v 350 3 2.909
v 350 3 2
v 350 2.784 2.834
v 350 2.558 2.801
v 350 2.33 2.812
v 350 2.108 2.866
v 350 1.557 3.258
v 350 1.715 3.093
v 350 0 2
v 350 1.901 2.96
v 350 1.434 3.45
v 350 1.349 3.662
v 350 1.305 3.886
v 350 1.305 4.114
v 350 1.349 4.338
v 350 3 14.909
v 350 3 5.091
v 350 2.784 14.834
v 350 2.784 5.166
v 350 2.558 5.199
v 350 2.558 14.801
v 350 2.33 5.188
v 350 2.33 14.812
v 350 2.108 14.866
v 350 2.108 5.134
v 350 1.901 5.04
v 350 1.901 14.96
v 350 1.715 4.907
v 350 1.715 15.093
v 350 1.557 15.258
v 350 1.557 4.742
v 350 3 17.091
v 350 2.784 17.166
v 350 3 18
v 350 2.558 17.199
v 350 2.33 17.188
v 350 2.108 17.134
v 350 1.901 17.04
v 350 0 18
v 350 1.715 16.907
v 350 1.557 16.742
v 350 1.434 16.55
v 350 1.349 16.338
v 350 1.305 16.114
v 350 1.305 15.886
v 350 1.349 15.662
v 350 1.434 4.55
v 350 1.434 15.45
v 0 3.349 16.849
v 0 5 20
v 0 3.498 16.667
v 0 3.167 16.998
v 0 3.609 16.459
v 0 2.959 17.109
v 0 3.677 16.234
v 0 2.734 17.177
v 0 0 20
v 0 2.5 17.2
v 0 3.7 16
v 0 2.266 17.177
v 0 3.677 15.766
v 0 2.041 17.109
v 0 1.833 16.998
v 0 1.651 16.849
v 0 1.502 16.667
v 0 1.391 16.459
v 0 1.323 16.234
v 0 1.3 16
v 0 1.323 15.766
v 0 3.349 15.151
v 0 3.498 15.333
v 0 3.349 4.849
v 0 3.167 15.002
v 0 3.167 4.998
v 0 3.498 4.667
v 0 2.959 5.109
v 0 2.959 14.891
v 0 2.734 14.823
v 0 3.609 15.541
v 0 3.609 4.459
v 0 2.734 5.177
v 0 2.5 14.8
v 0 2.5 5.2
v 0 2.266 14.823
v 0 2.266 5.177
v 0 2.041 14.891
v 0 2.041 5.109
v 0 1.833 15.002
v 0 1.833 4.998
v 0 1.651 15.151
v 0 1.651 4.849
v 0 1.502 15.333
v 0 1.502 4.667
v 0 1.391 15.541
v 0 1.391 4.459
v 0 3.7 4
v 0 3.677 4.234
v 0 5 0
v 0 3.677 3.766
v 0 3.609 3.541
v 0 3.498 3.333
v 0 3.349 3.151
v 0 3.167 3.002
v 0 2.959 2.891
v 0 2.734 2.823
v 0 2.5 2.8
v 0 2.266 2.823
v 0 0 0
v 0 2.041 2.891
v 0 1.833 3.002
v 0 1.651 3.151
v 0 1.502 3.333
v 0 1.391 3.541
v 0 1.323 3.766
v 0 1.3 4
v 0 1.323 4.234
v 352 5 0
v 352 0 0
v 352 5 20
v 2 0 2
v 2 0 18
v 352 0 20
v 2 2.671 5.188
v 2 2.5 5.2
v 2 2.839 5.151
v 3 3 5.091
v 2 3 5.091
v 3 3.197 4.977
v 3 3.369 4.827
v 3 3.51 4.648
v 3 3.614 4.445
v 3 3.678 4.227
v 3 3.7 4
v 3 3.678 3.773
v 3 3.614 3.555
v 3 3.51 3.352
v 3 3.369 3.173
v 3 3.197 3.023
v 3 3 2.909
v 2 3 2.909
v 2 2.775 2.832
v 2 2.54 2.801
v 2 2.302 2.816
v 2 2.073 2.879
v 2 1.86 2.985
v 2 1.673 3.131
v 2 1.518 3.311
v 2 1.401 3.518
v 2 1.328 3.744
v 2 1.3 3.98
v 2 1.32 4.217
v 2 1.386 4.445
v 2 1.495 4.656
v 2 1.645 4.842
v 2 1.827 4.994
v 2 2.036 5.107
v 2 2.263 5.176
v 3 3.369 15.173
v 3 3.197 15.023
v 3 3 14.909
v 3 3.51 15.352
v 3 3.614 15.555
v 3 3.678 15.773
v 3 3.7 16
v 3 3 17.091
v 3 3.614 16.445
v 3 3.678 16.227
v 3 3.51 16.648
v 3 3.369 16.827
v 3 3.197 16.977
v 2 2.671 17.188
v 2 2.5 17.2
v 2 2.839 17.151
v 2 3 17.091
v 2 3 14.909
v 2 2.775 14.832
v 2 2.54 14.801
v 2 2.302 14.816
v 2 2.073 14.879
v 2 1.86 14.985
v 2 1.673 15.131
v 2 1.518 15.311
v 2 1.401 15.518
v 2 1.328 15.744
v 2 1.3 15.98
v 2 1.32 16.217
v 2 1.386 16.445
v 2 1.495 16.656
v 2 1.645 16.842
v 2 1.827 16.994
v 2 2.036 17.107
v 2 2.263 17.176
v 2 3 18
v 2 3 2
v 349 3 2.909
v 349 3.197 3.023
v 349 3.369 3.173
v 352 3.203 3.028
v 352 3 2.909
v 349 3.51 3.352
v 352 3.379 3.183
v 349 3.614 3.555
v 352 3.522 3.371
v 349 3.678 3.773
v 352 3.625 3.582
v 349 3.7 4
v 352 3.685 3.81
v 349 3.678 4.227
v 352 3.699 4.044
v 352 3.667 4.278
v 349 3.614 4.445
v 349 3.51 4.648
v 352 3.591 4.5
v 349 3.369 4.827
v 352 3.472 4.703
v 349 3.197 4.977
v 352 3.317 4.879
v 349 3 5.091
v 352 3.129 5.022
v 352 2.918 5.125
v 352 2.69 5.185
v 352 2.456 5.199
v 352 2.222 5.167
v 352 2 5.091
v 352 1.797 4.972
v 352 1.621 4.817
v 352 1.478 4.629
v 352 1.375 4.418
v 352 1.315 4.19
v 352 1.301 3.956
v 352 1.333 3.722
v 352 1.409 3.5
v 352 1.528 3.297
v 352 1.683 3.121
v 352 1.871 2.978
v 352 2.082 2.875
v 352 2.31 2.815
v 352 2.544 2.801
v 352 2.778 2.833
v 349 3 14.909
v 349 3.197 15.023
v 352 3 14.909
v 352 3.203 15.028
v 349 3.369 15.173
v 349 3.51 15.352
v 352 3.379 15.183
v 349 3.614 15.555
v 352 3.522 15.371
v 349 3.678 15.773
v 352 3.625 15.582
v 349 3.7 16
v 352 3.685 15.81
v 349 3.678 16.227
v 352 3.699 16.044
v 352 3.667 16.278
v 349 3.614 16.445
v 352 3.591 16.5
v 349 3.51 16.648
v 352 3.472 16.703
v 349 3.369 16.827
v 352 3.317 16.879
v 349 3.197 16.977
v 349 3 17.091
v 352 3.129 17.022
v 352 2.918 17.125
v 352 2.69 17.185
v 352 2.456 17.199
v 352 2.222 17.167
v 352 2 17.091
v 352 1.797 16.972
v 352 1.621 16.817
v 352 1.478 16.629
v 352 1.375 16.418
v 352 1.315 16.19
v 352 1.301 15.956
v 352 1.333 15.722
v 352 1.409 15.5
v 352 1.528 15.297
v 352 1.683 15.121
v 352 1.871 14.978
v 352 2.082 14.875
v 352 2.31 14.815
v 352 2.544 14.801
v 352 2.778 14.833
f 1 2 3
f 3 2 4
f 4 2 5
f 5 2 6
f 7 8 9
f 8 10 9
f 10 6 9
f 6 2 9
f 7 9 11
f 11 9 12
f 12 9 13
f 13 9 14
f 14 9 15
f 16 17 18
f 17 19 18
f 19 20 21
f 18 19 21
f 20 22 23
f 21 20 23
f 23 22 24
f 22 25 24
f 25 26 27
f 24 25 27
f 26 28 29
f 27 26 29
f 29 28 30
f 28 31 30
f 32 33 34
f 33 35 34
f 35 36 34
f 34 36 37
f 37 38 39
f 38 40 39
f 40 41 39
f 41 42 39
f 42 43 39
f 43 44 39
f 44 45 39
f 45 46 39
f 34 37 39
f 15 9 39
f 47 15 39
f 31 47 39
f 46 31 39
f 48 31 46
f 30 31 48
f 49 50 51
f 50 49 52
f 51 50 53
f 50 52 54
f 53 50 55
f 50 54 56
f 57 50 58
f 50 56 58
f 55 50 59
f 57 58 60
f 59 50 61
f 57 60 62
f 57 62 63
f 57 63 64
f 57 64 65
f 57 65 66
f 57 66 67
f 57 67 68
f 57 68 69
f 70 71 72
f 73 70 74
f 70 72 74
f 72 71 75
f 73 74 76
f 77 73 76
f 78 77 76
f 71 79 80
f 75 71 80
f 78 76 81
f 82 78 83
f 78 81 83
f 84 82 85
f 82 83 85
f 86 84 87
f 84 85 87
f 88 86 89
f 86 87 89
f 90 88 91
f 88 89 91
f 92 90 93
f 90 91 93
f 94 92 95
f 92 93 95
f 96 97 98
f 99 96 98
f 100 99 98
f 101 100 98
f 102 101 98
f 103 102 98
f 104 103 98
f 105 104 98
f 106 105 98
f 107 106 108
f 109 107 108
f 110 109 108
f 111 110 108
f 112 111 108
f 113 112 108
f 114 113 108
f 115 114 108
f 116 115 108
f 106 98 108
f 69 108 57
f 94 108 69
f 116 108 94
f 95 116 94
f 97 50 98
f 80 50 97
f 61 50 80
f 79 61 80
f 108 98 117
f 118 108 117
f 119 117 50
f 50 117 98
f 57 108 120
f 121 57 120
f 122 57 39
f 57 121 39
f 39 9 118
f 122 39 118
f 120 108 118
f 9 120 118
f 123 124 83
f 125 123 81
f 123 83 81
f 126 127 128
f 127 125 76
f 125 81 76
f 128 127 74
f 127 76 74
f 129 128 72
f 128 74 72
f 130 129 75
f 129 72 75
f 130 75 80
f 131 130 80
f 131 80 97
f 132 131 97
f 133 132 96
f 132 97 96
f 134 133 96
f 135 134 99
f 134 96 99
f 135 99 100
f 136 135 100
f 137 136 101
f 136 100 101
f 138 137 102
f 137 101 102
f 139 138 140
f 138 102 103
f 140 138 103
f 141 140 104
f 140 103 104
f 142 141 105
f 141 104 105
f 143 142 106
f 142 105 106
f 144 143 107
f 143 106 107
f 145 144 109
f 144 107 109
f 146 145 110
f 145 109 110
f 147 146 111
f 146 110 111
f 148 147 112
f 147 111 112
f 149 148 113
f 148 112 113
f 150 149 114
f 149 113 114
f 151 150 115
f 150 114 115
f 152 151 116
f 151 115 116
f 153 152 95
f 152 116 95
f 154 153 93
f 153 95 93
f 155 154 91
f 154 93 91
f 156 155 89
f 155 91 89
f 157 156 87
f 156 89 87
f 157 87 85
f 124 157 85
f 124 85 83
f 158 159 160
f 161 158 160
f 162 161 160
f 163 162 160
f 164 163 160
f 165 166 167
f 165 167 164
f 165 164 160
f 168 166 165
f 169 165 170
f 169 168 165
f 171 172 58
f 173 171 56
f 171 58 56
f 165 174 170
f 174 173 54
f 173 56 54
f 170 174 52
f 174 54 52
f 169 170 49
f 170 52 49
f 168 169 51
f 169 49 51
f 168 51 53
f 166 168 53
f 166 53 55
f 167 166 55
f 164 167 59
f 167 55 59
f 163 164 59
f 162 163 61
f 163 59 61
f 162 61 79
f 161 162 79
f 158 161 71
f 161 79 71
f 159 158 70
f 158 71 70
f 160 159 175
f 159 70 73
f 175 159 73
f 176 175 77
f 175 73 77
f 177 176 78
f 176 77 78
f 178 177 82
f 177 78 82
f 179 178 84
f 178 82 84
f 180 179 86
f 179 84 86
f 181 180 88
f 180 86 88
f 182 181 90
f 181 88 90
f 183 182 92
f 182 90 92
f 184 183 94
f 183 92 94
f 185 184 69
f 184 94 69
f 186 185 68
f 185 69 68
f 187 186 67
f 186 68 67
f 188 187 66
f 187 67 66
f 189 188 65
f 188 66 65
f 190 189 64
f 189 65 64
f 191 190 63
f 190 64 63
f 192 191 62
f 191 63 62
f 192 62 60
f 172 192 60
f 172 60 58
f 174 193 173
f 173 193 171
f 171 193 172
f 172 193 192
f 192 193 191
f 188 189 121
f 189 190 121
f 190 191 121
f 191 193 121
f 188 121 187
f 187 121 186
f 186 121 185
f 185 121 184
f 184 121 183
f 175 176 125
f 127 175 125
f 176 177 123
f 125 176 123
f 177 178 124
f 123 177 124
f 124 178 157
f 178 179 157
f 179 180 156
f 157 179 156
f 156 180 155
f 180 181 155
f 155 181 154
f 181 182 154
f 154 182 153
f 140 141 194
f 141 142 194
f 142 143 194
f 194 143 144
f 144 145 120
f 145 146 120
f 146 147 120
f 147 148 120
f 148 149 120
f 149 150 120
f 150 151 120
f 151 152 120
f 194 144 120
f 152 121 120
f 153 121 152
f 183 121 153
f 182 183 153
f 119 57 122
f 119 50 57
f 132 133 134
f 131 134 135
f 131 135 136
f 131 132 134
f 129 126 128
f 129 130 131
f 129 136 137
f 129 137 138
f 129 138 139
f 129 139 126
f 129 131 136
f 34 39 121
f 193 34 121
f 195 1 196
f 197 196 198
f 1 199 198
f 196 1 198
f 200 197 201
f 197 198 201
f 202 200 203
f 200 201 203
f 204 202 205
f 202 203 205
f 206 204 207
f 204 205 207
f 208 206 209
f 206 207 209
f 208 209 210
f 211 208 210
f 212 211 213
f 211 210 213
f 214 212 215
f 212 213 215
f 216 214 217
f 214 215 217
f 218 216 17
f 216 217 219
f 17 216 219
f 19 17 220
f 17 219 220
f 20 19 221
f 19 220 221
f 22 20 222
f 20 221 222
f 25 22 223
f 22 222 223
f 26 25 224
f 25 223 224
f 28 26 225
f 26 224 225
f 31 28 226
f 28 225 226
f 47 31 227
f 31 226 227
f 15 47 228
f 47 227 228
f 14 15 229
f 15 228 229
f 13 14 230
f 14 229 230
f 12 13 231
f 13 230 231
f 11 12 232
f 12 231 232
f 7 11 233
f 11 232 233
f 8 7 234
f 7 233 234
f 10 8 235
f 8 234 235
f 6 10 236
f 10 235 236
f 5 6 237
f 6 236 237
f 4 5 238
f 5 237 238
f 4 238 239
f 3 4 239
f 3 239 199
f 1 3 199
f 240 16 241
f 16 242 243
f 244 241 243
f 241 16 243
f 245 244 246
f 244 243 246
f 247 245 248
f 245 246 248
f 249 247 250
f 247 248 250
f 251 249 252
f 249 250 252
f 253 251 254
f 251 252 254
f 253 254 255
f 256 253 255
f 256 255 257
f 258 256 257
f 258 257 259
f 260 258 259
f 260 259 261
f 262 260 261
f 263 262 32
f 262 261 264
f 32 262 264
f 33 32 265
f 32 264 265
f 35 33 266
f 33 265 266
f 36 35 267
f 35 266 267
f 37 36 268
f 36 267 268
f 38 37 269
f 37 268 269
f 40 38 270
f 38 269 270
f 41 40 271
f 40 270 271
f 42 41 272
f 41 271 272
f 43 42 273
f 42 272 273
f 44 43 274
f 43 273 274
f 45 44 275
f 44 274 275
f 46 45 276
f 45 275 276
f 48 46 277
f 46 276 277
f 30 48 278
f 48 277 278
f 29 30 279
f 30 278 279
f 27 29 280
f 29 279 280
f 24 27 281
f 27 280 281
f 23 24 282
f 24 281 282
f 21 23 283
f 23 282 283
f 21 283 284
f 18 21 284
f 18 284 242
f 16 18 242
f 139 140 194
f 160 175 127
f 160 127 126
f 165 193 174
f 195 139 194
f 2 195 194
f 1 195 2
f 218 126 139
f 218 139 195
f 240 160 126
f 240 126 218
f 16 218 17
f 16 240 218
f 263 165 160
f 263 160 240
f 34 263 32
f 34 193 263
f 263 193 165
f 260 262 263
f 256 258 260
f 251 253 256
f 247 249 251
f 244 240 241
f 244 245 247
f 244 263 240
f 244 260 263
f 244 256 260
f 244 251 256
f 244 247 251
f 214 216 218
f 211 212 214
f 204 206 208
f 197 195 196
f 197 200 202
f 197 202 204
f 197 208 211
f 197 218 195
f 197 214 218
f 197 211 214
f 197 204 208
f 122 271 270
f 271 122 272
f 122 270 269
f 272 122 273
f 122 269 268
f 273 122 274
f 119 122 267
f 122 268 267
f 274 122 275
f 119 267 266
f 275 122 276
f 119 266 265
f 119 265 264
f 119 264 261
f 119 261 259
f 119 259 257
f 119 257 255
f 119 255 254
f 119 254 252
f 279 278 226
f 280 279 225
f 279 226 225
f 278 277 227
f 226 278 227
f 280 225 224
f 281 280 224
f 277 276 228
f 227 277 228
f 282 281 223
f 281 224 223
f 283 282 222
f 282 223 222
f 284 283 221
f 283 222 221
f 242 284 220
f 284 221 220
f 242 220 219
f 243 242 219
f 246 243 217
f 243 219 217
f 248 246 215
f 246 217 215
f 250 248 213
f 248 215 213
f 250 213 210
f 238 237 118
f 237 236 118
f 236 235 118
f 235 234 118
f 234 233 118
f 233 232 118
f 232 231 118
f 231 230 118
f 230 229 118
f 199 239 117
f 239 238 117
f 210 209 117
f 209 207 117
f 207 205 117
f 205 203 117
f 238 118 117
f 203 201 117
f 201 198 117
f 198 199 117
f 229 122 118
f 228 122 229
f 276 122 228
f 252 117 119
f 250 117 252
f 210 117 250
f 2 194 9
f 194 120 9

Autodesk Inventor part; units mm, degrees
ref_plane "YZ Plane" through (0, 0, 0) normal (1, 0, 0) x (0, 1, 0)
ref_plane "XZ Plane" through (0, 0, 0) normal (0, 1, 0) x (-1, 0, 0)
ref_plane "XY Plane" through (0, 0, 0) normal (0, 0, 1) x (1, 0, 0)
sketch "スケッチ1" plane through (0, 0, 0) normal (0, 0, 1) x (1, 0, 0)
  line L0 (0, 0) -> (352, 0)
  line L1 (352, 0) -> (352, 5)
  line L2 (352, 5) -> (0, 5)
  line L3 (0, 5) -> (0, 0)
  line L4 (0, 0) -> (6, 0)
  line L5 (0, 1) -> (0, 0)
  dimension "d0" = 352
  dimension "d1" = 5
extrude "押し出し1" add sketch "スケッチ1" along normal blind 20
sketch "スケッチ3" plane through (0, 0, 0) normal (-1, 0, 0) x (0, 0, 1)
  line L0 (0, 5) -> (0, 0) projected
  line L1 (0, 0) -> (20, 0) projected
  line L2 (20, 5) -> (20, 0) projected
  line L3 (0, 5) -> (20, 5) projected
  circle A0 centre (4, 2.5) radius 1.2
  circle A1 centre (16, 2.5) radius 1.2
  dimension "d14" = 2.4
  dimension "d15" = 2.4
  dimension "d16" = 2.5
  dimension "d17" = 4
  dimension "d18" = 4
  dimension "d19" = 2.5
extrude "押し出し3" cut sketch "スケッチ3" against normal blind 3 contours A0 | A1
sketch "スケッチ4" plane through (0, 0, 0) normal (0, -1, 0) x (1, 0, 0)
  line L0 (0, 0) -> (352, 0) projected
  line L1 (352, 0) -> (352, 20) projected
  line L2 (0, 20) -> (352, 20) projected
  line L3 (0, 0) -> (0, 20) projected
  line L4 (2, 2) -> (350, 2)
  line L5 (350, 2) -> (350, 18)
  line L6 (350, 18) -> (2, 18)
  line L7 (2, 18) -> (2, 2)
  dimension "d22" = 2
  dimension "d23" = 2
  dimension "d24" = 2
  dimension "d25" = 2
extrude "押し出し4" cut sketch "スケッチ4" against normal blind 3 contours L7 L6 L5 L4
sketch "スケッチ5" plane through (352, 0, 0) normal (1, 0, 0) x (0, 0, -1)
  arc A0 (-5.0909, 3) -> (-2.9091, 3) centre (-4, 2.5) ccw projected
  arc A1 (-2.9091, 3) -> (-5.0909, 3) centre (-4, 2.5) ccw projected
  arc A2 (-17.0909, 3) -> (-14.9091, 3) centre (-16, 2.5) ccw projected
  arc A3 (-14.9091, 3) -> (-17.0909, 3) centre (-16, 2.5) ccw projected
extrude "押し出し5" cut sketch "スケッチ5" against normal blind 3
properties part number "arm1_L" material "アルミニウム 6061"
